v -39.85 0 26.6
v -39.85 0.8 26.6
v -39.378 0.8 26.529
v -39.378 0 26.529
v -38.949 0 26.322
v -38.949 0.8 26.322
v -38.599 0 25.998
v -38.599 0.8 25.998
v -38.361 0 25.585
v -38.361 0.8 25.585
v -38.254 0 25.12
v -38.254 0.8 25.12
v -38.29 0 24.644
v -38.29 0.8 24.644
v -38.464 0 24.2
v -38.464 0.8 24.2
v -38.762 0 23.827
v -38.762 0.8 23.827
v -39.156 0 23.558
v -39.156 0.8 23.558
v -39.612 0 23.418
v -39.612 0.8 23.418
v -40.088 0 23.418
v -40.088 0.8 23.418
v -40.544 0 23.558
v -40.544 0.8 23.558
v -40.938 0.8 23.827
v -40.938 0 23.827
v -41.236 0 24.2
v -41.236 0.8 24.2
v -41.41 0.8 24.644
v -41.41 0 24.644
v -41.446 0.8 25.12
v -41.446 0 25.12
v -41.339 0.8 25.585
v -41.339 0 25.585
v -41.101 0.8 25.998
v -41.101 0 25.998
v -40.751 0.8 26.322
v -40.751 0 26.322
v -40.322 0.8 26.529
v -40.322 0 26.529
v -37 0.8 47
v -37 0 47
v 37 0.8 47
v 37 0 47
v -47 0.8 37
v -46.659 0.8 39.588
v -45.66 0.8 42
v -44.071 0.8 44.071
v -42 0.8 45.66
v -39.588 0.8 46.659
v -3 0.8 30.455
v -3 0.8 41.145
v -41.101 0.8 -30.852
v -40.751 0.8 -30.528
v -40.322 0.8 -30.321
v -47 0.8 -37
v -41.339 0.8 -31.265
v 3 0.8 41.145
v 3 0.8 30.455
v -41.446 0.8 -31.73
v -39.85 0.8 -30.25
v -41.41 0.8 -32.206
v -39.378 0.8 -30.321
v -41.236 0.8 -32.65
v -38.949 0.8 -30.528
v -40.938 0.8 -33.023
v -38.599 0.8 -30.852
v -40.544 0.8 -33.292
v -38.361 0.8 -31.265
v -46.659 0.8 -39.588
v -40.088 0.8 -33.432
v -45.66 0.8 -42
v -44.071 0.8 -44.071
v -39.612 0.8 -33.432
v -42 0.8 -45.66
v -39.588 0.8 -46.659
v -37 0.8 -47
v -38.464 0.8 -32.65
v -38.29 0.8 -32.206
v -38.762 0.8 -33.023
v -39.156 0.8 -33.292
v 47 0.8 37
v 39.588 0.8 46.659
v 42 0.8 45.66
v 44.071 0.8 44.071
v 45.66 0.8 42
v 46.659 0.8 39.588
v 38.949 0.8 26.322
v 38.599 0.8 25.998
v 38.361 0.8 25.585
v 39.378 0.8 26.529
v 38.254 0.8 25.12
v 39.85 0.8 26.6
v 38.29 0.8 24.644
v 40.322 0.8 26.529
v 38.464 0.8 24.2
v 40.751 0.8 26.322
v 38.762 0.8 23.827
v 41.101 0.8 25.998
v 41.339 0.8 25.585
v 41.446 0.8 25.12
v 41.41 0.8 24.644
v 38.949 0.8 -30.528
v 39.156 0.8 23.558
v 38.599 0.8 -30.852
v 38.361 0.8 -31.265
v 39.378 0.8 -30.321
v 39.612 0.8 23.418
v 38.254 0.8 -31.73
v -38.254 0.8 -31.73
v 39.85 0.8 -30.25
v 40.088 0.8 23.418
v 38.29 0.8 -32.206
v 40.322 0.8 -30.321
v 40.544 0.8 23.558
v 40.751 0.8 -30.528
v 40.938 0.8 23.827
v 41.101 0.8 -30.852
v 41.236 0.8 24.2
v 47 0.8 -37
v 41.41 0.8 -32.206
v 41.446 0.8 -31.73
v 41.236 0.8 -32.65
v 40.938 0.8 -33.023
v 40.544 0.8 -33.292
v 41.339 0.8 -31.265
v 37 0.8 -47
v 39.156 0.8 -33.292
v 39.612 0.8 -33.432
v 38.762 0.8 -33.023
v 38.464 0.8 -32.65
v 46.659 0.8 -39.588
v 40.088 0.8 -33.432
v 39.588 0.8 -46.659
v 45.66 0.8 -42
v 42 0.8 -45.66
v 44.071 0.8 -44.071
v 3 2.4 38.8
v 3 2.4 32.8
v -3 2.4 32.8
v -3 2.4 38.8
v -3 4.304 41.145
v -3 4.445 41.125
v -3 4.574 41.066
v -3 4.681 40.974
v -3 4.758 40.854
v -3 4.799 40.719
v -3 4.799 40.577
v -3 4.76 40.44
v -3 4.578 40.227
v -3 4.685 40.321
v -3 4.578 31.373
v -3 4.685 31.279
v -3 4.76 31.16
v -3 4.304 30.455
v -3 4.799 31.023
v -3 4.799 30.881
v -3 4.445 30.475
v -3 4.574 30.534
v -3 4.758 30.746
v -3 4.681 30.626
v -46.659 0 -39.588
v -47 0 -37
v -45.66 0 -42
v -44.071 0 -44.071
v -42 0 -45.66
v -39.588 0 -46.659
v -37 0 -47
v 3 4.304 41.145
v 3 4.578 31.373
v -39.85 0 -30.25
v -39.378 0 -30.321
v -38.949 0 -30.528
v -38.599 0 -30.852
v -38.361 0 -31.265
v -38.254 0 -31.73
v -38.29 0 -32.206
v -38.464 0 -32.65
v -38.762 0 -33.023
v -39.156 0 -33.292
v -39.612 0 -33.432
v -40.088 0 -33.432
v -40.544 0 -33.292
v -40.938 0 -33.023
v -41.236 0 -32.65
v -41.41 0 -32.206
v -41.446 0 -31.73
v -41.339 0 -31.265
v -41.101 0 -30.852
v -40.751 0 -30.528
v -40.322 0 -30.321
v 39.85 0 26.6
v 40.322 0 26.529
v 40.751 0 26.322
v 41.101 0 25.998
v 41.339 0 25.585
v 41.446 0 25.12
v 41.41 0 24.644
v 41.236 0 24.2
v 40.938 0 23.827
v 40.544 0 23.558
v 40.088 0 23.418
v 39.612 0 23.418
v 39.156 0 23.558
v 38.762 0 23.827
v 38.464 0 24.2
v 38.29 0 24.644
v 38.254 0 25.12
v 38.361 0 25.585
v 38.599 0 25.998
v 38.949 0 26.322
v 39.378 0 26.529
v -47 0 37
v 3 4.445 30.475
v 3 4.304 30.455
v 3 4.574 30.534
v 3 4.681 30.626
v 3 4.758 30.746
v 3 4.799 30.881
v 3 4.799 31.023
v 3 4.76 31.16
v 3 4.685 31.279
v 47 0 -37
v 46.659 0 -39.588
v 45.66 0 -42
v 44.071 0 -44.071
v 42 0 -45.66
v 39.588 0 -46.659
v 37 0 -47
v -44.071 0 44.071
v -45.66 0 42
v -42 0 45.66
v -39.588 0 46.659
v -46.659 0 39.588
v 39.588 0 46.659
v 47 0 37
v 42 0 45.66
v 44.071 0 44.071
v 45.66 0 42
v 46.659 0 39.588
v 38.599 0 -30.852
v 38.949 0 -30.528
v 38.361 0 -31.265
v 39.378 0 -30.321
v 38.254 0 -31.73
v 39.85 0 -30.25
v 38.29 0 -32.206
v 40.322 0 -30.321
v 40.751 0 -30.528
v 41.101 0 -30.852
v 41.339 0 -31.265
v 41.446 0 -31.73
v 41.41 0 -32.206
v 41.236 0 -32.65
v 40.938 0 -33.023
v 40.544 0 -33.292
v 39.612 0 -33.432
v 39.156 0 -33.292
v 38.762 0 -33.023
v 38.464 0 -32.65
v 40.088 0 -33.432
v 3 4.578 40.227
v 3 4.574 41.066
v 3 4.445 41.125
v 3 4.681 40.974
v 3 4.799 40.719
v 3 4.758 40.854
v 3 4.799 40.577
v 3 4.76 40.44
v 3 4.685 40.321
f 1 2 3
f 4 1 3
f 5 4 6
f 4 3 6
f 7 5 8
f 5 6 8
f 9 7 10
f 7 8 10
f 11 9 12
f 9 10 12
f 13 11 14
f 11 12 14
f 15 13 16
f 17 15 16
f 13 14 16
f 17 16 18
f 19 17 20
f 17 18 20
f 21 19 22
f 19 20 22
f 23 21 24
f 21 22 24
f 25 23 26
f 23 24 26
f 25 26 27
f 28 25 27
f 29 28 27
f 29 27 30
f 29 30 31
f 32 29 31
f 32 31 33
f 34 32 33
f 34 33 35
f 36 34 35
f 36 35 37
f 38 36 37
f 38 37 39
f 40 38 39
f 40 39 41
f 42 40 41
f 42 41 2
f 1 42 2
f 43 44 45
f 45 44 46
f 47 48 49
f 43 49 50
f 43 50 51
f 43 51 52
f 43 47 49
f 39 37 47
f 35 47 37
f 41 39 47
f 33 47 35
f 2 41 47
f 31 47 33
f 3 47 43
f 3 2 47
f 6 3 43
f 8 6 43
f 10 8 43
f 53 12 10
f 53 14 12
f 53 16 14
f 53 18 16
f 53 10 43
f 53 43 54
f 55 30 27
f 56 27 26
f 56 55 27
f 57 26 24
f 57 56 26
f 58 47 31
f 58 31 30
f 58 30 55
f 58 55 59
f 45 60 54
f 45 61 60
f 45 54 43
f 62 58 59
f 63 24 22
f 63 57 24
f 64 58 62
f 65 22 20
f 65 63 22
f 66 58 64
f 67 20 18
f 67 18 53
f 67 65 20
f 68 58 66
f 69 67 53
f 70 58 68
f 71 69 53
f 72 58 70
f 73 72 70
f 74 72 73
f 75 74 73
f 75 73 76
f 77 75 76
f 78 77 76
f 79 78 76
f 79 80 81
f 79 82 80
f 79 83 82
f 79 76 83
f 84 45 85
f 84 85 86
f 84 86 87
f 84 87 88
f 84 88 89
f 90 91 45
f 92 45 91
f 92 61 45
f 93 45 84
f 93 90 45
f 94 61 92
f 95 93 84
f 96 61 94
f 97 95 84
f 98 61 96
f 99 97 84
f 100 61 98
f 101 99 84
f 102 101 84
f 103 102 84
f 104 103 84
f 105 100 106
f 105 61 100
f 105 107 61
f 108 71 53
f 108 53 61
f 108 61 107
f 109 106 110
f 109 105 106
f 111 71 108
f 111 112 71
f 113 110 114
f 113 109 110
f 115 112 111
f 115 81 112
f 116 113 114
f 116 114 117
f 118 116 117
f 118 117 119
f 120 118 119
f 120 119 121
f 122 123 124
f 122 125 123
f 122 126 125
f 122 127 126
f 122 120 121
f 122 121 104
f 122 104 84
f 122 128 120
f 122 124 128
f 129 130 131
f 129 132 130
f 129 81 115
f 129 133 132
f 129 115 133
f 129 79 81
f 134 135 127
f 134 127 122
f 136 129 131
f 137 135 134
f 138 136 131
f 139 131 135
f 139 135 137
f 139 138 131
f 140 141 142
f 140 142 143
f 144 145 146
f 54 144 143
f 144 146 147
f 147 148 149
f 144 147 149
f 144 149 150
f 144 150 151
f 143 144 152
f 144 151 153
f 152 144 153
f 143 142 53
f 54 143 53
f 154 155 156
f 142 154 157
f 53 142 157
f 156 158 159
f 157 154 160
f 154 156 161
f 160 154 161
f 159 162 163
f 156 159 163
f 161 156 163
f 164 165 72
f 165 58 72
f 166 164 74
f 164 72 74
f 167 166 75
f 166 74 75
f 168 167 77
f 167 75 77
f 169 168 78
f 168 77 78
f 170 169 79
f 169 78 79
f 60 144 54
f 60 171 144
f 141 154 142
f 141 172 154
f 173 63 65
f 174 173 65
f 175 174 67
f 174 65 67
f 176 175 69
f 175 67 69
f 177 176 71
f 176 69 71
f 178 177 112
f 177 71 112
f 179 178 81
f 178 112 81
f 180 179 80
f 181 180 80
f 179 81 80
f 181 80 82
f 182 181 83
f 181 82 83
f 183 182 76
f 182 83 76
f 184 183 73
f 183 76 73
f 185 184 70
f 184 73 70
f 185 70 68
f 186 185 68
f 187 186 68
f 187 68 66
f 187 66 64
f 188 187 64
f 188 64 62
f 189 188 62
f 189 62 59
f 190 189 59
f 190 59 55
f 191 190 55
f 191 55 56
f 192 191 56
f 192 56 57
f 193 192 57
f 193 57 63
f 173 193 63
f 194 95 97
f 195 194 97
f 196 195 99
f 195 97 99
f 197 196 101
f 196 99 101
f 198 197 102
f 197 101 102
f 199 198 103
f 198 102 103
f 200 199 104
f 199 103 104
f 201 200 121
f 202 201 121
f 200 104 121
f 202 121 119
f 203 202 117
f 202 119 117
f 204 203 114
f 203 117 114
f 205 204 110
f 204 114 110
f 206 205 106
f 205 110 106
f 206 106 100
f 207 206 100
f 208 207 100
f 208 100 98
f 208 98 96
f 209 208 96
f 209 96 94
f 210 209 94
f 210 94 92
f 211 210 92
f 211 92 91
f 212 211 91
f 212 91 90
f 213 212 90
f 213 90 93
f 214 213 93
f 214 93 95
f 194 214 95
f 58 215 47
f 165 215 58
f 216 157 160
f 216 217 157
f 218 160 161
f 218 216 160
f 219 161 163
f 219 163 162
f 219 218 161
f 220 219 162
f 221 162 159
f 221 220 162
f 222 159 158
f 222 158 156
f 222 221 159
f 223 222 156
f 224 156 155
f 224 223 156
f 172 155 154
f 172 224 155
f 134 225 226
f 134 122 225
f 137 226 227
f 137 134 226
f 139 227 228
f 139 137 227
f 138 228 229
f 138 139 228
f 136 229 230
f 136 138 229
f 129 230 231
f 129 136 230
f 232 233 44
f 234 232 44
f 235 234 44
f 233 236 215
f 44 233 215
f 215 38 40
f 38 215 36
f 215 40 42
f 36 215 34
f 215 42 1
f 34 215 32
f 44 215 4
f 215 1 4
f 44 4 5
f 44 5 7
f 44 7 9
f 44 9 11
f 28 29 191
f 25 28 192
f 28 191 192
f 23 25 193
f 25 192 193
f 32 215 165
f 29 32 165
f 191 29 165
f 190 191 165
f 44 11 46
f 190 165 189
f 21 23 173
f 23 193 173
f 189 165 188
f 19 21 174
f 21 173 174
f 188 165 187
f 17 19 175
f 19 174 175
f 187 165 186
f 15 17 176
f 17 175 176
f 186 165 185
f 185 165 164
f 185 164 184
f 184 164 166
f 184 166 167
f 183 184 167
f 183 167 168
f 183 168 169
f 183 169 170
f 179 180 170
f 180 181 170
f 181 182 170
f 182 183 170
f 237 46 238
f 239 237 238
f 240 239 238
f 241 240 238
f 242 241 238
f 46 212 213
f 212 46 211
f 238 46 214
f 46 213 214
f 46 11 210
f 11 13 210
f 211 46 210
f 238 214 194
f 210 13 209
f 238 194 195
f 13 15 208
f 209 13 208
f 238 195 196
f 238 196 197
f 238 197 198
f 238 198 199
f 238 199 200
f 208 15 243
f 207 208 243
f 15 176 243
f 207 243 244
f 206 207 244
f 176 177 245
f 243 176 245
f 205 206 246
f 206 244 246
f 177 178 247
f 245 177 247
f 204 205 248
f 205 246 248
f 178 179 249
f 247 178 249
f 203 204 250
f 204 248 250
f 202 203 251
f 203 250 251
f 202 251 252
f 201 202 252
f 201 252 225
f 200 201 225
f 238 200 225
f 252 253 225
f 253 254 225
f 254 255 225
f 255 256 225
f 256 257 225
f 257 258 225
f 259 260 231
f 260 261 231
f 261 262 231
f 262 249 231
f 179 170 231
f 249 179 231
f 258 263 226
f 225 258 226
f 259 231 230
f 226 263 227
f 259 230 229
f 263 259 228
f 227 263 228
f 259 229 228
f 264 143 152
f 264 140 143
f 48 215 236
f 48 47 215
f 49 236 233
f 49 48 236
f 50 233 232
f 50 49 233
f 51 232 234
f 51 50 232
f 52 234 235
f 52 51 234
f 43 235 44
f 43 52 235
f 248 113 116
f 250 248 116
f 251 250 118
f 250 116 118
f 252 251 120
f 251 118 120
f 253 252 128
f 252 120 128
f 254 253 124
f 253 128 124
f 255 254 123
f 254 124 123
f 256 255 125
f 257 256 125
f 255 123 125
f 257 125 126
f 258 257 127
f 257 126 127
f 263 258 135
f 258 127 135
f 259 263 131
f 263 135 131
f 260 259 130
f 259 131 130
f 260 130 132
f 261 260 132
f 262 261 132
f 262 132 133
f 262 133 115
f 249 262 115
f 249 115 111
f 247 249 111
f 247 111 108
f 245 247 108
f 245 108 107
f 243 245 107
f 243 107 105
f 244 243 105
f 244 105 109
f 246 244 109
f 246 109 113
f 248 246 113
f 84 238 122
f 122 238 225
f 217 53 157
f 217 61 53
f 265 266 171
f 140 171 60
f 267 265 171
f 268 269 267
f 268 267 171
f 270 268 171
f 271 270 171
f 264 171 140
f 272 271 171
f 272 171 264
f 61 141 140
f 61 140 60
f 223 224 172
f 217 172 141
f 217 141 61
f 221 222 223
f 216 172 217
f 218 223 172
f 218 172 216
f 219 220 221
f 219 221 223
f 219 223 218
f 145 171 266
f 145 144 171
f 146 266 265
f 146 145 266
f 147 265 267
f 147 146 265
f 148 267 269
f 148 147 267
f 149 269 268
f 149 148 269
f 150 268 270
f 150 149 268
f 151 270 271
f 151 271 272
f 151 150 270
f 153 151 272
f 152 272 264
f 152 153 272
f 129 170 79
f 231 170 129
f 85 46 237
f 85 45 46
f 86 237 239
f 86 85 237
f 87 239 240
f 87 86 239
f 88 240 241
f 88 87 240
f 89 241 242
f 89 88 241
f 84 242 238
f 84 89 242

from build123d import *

# Parameters (mm, degrees)
SKETCH_1_W             = 94
SKETCH_1_H             = 94
EXTRUDE_1088_DEPTH     = 0.8
FILLET_1_R             = 10
CUT_EXTRUDE_1446_REACH = 68.473
SKETCH_2_R             = 1.6
EXTRUDE_1491_DEPTH     = 3
FILLET_2_R             = 0.5


with BuildPart() as part:
    # 草图1 → Extrude 1088 (new body)
    with BuildSketch(Plane(origin=(0, 0, 0), x_dir=(1, 0, 0), z_dir=(0, 1, 0))):
        Rectangle(SKETCH_1_W, SKETCH_1_H)
    extrude(amount=EXTRUDE_1088_DEPTH)

    # 圆角1
    fillet_1_edges = [part.edges().sort_by_distance(p)[0] for p in [
        (47, 0.4, 47),
        (-47, 0.4, 47),
        (-47, 0.4, -47),
        (47, 0.4, -47),
    ]]
    fillet(fillet_1_edges, radius=FILLET_1_R)

    # 草图2 → Cut-Extrude 1446 (cut, up to next)
    with BuildSketch(Plane(origin=(0, 0.8, 0), x_dir=(1, 0, 0), z_dir=(0, 1, 0)), mode=Mode.PRIVATE) as cut_extrude_1446_sk1:
        with Locations(Location((-39.85, 31.85, 0), (0, 0, 270))):
            Circle(SKETCH_2_R)
    cut_extrude_1446_tool1 = extrude(cut_extrude_1446_sk1.sketch, amount=-CUT_EXTRUDE_1446_REACH, mode=Mode.PRIVATE) & part.part
    # 草图2 → Cut-Extrude 1446 (cut, up to next)
    with BuildSketch(Plane(origin=(0, 0.8, 0), x_dir=(1, 0, 0), z_dir=(0, 1, 0)), mode=Mode.PRIVATE) as cut_extrude_1446_sk2:
        with Locations(Location((39.85, 31.85, 0), (0, 0, 270))):
            Circle(SKETCH_2_R)
    cut_extrude_1446_tool2 = extrude(cut_extrude_1446_sk2.sketch, amount=-CUT_EXTRUDE_1446_REACH, mode=Mode.PRIVATE) & part.part
    # 草图2 → Cut-Extrude 1446 (cut, up to next)
    with BuildSketch(Plane(origin=(0, 0.8, 0), x_dir=(1, 0, 0), z_dir=(0, 1, 0)), mode=Mode.PRIVATE) as cut_extrude_1446_sk3:
        with Locations(Location((39.85, -25, 0), (0, 0, 270))):
            Circle(SKETCH_2_R)
    cut_extrude_1446_tool3 = extrude(cut_extrude_1446_sk3.sketch, amount=-CUT_EXTRUDE_1446_REACH, mode=Mode.PRIVATE) & part.part
    # 草图2 → Cut-Extrude 1446 (cut, up to next)
    with BuildSketch(Plane(origin=(0, 0.8, 0), x_dir=(1, 0, 0), z_dir=(0, 1, 0)), mode=Mode.PRIVATE) as cut_extrude_1446_sk4:
        with Locations(Location((-39.85, -25, 0), (0, 0, 270))):
            Circle(SKETCH_2_R)
    cut_extrude_1446_tool4 = extrude(cut_extrude_1446_sk4.sketch, amount=-CUT_EXTRUDE_1446_REACH, mode=Mode.PRIVATE) & part.part
    add(cut_extrude_1446_tool1.solids().sort_by_distance((-39.85, 0.8, -31.85))[0], mode=Mode.SUBTRACT)
    add(cut_extrude_1446_tool2.solids().sort_by_distance((39.85, 0.8, -31.85))[0], mode=Mode.SUBTRACT)
    add(cut_extrude_1446_tool3.solids().sort_by_distance((39.85, 0.8, 25))[0], mode=Mode.SUBTRACT)
    add(cut_extrude_1446_tool4.solids().sort_by_distance((-39.85, 0.8, 25))[0], mode=Mode.SUBTRACT)

    # 草图4 → Extrude 1491 (add, symmetric)
    with BuildSketch(Plane(origin=(0, 0, 0), x_dir=(0, 0, -1), z_dir=(1, 0, 0))):
        Polygon((-41.145, 0.8), (-30.455, 0.8), (-30.455, 5.98), (-32.8, 2.4), (-38.8, 2.4), (-41.145, 5.98), align=None)
    extrude(amount=EXTRUDE_1491_DEPTH, both=True)

    # 圆角2
    fillet_2_edges = [part.edges().sort_by_distance(p)[0] for p in [
        (0, 5.98, 41.145),
        (0, 5.98, 30.455),
    ]]
    fillet(fillet_2_edges, radius=FILLET_2_R)


solid = part.part
